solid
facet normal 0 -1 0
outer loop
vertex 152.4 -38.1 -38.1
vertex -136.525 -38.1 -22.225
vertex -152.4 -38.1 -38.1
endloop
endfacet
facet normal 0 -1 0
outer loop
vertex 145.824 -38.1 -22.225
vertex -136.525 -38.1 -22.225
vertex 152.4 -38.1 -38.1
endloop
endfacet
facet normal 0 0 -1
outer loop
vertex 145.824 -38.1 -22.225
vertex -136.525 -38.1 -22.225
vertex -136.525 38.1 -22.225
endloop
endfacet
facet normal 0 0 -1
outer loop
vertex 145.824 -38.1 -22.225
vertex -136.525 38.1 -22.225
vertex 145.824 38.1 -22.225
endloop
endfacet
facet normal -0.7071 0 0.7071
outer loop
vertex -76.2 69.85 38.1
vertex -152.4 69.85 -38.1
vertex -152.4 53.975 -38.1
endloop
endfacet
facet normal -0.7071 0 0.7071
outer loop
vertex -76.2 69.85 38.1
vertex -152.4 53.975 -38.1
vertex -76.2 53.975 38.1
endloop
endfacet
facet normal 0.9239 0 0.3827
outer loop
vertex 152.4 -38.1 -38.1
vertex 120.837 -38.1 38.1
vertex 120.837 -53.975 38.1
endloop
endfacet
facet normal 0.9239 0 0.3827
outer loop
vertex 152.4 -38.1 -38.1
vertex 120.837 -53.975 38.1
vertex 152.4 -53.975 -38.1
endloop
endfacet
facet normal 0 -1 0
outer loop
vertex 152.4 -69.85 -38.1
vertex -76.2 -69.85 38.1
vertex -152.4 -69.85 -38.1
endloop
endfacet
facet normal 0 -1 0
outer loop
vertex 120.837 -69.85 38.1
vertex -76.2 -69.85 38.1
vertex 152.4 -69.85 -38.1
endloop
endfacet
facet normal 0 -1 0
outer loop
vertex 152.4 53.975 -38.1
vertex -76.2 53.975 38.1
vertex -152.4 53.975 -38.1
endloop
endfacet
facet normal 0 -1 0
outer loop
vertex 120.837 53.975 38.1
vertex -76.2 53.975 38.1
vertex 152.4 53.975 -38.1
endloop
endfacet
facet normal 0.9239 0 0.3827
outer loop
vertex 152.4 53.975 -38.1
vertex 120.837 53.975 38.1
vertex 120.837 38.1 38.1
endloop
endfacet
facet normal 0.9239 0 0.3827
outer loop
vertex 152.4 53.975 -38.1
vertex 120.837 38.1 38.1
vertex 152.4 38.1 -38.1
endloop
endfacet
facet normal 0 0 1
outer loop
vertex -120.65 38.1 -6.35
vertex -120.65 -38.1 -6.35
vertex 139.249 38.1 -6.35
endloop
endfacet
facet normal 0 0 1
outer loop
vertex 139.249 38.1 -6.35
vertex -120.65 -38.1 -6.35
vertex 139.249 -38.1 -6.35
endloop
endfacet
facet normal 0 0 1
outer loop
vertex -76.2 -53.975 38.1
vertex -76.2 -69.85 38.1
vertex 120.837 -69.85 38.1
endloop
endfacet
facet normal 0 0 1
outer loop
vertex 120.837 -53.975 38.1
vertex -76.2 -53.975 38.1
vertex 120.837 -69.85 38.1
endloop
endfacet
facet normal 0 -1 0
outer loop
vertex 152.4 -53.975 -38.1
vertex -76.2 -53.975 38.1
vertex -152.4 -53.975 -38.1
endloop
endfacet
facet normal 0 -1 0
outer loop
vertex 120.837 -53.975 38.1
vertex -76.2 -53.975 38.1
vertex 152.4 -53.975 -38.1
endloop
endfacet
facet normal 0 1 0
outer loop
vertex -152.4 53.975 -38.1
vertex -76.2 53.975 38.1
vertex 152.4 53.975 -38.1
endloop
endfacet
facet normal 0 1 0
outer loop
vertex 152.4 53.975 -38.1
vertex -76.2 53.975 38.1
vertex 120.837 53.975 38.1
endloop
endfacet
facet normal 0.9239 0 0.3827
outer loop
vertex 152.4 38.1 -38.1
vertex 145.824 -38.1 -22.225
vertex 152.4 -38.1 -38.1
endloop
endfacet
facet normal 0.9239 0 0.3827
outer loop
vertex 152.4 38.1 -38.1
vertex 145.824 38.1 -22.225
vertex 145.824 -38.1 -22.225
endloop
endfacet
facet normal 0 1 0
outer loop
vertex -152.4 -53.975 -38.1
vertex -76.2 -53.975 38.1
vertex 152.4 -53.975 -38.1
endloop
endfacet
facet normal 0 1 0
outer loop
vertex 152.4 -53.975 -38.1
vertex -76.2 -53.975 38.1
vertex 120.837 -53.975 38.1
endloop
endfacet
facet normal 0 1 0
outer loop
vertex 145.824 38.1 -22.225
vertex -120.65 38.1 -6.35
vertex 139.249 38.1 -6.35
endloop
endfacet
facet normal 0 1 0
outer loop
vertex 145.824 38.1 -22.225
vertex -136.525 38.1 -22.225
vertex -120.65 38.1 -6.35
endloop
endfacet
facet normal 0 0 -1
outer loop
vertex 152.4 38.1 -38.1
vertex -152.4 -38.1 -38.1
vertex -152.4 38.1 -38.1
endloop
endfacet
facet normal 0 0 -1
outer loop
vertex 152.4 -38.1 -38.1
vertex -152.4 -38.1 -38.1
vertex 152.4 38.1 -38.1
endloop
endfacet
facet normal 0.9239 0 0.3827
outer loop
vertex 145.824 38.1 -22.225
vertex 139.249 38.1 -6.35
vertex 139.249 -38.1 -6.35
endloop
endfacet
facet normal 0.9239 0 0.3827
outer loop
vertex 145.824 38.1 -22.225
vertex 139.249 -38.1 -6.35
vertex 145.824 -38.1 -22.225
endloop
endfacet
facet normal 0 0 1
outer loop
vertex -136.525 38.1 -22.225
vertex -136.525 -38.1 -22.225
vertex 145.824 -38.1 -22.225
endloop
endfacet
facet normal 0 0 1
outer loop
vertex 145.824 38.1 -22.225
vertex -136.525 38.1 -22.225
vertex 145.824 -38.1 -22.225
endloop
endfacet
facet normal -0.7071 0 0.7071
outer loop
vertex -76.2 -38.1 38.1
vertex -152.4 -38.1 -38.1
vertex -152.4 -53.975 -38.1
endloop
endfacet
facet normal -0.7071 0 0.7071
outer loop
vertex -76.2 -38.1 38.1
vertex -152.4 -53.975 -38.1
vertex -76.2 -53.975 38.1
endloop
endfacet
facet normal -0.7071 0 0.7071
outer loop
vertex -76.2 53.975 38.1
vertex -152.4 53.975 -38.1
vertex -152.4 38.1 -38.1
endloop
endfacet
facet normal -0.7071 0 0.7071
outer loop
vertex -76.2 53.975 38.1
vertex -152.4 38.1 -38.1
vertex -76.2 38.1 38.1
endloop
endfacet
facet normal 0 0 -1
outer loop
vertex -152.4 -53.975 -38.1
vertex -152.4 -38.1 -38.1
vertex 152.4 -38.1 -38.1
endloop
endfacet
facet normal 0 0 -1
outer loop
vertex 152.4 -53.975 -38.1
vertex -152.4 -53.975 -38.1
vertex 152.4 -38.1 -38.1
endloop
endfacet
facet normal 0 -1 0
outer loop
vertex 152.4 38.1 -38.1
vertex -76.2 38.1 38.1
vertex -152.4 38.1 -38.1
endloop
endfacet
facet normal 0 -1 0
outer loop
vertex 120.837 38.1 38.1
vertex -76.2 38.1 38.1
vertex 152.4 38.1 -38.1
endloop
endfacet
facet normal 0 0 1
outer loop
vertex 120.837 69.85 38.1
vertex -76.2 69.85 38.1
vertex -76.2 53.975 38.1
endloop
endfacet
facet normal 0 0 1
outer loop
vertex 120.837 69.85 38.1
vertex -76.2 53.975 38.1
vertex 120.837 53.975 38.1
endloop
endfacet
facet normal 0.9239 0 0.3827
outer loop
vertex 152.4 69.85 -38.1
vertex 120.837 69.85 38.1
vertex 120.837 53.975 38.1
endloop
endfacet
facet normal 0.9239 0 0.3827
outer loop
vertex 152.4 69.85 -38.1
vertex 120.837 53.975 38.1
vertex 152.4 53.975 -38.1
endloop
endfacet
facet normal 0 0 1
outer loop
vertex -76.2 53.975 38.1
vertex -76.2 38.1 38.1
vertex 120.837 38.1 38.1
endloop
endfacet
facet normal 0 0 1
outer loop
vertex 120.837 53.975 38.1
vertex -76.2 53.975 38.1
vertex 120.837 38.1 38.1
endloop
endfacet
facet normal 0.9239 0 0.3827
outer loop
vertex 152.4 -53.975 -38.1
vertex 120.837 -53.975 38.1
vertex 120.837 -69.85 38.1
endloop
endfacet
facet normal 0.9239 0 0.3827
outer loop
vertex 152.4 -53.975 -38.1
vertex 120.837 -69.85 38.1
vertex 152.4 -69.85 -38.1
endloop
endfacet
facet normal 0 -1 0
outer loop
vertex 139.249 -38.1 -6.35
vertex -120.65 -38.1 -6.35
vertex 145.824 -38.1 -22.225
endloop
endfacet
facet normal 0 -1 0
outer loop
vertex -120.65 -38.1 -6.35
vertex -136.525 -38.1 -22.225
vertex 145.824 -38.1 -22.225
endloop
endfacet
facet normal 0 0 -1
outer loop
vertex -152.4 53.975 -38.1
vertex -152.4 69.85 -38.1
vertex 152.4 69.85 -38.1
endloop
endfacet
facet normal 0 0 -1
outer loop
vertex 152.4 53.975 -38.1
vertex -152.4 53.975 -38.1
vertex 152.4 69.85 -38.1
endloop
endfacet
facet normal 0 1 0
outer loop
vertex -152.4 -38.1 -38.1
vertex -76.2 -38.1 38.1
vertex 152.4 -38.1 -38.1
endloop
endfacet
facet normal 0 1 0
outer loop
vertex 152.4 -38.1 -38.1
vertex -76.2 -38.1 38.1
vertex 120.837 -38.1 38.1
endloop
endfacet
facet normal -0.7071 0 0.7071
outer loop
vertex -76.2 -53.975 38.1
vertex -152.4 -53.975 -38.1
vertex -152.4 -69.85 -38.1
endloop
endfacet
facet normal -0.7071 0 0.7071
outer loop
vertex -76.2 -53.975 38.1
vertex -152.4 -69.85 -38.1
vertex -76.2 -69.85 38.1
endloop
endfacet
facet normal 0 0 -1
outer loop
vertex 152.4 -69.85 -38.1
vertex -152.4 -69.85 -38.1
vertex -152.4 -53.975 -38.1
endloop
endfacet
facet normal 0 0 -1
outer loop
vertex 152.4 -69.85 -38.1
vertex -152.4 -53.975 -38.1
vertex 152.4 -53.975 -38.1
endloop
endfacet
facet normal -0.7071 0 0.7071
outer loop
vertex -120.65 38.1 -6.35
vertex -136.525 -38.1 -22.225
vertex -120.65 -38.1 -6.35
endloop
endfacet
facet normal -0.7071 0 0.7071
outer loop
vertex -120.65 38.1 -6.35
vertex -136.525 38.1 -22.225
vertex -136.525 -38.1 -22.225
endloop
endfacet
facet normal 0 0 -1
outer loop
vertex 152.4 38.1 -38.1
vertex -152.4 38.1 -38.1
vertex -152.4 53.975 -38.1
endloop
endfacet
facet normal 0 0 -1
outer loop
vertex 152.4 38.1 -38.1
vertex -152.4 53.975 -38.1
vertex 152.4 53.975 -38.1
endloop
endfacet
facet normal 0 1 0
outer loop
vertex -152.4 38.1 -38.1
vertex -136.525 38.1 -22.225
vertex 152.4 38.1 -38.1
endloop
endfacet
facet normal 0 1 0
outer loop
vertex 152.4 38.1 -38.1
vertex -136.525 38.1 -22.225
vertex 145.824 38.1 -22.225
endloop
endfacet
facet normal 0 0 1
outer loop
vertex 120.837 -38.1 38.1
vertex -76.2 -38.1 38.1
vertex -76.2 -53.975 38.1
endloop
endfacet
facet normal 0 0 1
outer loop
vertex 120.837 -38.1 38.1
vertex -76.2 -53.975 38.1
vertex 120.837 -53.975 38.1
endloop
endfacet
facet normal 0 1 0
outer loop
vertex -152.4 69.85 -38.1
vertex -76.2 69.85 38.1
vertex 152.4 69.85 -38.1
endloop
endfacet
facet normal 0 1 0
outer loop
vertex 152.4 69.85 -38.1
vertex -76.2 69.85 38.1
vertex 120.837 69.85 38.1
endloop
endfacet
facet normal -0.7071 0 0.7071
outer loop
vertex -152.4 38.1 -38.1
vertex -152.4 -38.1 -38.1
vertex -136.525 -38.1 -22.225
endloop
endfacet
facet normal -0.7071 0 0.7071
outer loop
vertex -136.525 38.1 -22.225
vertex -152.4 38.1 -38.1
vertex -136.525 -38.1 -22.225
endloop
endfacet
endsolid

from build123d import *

# Parameters (mm, degrees)
F1_W          = 304.8
F1_H          = 76.2
F2_DEPTH      = 15.875
F5_W          = 304.8
F5_H          = 15.875
F6_DEPTH      = 76.2
F9_DEPTH      = 69.851
F9_DEPTH_BACK = 69.851


# Not quite as in the source:
# - a length typed as a fraction of an inch, garbled in the dataset ("3 / 203.2 mm" for 3/8 in), is restored


with BuildPart() as f2:
    # F1 (on offset) → F2 (new body)
    with BuildSketch(Plane.XZ.offset(38.1)):
        Rectangle(F1_W, F1_H)
    extrude(amount=F2_DEPTH)


with BuildPart() as f3_1:
    # F3: instance of F2
    add(f2.part.mirror(Plane.XZ.offset(53.975)))


with BuildPart() as f4_1:
    # F4: instance of F2
    add(f2.part.mirror(Plane.XZ))


with BuildPart() as f4_2:
    # F4: instance of F3_1
    add(f3_1.part.mirror(Plane.XZ))


with BuildPart() as f6:
    # F5 (on offset) → F6 (new body, through all)
    with BuildSketch(Plane.XZ.offset(38.1)):
        with Locations((0, -30.1625)):
            Rectangle(F5_W, F5_H)
    extrude(amount=-F6_DEPTH)


with BuildPart() as f7_1:
    # F7: instance of F6
    add(f6.part.mirror(Plane.XY.offset(-22.225)))


with BuildPart() as f9_tool:
    # F8 (on Front) → F9 (new body, two sides)
    with BuildSketch(Plane.XZ) as f9_sk:
        Polygon((-152.4, 38.1), (-152.4, -38.1), (-76.2, 38.1), align=None)
        Polygon((120.8369265472, 38.1), (152.4, -38.1), (152.4, 38.1), align=None)
    extrude(amount=-F9_DEPTH)
    extrude(f9_sk.sketch, amount=F9_DEPTH_BACK)


with BuildPart() as f2_1:
    add(f2.part)

    # F9: cut by f9_tool
    add(f9_tool.part, mode=Mode.SUBTRACT)


with BuildPart() as f3_1_1:
    add(f3_1.part)

    # F9: cut by f9_tool
    add(f9_tool.part, mode=Mode.SUBTRACT)


with BuildPart() as f4_1_1:
    add(f4_1.part)

    # F9: cut by f9_tool
    add(f9_tool.part, mode=Mode.SUBTRACT)


with BuildPart() as f4_2_1:
    add(f4_2.part)

    # F9: cut by f9_tool
    add(f9_tool.part, mode=Mode.SUBTRACT)


with BuildPart() as f6_1:
    add(f6.part)

    # F9: cut by f9_tool
    add(f9_tool.part, mode=Mode.SUBTRACT)


with BuildPart() as f7_1_1:
    add(f7_1.part)

    # F9: cut by f9_tool
    add(f9_tool.part, mode=Mode.SUBTRACT)


solid = Compound([f2_1.part, f3_1_1.part, f4_1_1.part, f4_2_1.part, f6_1.part, f7_1_1.part])
